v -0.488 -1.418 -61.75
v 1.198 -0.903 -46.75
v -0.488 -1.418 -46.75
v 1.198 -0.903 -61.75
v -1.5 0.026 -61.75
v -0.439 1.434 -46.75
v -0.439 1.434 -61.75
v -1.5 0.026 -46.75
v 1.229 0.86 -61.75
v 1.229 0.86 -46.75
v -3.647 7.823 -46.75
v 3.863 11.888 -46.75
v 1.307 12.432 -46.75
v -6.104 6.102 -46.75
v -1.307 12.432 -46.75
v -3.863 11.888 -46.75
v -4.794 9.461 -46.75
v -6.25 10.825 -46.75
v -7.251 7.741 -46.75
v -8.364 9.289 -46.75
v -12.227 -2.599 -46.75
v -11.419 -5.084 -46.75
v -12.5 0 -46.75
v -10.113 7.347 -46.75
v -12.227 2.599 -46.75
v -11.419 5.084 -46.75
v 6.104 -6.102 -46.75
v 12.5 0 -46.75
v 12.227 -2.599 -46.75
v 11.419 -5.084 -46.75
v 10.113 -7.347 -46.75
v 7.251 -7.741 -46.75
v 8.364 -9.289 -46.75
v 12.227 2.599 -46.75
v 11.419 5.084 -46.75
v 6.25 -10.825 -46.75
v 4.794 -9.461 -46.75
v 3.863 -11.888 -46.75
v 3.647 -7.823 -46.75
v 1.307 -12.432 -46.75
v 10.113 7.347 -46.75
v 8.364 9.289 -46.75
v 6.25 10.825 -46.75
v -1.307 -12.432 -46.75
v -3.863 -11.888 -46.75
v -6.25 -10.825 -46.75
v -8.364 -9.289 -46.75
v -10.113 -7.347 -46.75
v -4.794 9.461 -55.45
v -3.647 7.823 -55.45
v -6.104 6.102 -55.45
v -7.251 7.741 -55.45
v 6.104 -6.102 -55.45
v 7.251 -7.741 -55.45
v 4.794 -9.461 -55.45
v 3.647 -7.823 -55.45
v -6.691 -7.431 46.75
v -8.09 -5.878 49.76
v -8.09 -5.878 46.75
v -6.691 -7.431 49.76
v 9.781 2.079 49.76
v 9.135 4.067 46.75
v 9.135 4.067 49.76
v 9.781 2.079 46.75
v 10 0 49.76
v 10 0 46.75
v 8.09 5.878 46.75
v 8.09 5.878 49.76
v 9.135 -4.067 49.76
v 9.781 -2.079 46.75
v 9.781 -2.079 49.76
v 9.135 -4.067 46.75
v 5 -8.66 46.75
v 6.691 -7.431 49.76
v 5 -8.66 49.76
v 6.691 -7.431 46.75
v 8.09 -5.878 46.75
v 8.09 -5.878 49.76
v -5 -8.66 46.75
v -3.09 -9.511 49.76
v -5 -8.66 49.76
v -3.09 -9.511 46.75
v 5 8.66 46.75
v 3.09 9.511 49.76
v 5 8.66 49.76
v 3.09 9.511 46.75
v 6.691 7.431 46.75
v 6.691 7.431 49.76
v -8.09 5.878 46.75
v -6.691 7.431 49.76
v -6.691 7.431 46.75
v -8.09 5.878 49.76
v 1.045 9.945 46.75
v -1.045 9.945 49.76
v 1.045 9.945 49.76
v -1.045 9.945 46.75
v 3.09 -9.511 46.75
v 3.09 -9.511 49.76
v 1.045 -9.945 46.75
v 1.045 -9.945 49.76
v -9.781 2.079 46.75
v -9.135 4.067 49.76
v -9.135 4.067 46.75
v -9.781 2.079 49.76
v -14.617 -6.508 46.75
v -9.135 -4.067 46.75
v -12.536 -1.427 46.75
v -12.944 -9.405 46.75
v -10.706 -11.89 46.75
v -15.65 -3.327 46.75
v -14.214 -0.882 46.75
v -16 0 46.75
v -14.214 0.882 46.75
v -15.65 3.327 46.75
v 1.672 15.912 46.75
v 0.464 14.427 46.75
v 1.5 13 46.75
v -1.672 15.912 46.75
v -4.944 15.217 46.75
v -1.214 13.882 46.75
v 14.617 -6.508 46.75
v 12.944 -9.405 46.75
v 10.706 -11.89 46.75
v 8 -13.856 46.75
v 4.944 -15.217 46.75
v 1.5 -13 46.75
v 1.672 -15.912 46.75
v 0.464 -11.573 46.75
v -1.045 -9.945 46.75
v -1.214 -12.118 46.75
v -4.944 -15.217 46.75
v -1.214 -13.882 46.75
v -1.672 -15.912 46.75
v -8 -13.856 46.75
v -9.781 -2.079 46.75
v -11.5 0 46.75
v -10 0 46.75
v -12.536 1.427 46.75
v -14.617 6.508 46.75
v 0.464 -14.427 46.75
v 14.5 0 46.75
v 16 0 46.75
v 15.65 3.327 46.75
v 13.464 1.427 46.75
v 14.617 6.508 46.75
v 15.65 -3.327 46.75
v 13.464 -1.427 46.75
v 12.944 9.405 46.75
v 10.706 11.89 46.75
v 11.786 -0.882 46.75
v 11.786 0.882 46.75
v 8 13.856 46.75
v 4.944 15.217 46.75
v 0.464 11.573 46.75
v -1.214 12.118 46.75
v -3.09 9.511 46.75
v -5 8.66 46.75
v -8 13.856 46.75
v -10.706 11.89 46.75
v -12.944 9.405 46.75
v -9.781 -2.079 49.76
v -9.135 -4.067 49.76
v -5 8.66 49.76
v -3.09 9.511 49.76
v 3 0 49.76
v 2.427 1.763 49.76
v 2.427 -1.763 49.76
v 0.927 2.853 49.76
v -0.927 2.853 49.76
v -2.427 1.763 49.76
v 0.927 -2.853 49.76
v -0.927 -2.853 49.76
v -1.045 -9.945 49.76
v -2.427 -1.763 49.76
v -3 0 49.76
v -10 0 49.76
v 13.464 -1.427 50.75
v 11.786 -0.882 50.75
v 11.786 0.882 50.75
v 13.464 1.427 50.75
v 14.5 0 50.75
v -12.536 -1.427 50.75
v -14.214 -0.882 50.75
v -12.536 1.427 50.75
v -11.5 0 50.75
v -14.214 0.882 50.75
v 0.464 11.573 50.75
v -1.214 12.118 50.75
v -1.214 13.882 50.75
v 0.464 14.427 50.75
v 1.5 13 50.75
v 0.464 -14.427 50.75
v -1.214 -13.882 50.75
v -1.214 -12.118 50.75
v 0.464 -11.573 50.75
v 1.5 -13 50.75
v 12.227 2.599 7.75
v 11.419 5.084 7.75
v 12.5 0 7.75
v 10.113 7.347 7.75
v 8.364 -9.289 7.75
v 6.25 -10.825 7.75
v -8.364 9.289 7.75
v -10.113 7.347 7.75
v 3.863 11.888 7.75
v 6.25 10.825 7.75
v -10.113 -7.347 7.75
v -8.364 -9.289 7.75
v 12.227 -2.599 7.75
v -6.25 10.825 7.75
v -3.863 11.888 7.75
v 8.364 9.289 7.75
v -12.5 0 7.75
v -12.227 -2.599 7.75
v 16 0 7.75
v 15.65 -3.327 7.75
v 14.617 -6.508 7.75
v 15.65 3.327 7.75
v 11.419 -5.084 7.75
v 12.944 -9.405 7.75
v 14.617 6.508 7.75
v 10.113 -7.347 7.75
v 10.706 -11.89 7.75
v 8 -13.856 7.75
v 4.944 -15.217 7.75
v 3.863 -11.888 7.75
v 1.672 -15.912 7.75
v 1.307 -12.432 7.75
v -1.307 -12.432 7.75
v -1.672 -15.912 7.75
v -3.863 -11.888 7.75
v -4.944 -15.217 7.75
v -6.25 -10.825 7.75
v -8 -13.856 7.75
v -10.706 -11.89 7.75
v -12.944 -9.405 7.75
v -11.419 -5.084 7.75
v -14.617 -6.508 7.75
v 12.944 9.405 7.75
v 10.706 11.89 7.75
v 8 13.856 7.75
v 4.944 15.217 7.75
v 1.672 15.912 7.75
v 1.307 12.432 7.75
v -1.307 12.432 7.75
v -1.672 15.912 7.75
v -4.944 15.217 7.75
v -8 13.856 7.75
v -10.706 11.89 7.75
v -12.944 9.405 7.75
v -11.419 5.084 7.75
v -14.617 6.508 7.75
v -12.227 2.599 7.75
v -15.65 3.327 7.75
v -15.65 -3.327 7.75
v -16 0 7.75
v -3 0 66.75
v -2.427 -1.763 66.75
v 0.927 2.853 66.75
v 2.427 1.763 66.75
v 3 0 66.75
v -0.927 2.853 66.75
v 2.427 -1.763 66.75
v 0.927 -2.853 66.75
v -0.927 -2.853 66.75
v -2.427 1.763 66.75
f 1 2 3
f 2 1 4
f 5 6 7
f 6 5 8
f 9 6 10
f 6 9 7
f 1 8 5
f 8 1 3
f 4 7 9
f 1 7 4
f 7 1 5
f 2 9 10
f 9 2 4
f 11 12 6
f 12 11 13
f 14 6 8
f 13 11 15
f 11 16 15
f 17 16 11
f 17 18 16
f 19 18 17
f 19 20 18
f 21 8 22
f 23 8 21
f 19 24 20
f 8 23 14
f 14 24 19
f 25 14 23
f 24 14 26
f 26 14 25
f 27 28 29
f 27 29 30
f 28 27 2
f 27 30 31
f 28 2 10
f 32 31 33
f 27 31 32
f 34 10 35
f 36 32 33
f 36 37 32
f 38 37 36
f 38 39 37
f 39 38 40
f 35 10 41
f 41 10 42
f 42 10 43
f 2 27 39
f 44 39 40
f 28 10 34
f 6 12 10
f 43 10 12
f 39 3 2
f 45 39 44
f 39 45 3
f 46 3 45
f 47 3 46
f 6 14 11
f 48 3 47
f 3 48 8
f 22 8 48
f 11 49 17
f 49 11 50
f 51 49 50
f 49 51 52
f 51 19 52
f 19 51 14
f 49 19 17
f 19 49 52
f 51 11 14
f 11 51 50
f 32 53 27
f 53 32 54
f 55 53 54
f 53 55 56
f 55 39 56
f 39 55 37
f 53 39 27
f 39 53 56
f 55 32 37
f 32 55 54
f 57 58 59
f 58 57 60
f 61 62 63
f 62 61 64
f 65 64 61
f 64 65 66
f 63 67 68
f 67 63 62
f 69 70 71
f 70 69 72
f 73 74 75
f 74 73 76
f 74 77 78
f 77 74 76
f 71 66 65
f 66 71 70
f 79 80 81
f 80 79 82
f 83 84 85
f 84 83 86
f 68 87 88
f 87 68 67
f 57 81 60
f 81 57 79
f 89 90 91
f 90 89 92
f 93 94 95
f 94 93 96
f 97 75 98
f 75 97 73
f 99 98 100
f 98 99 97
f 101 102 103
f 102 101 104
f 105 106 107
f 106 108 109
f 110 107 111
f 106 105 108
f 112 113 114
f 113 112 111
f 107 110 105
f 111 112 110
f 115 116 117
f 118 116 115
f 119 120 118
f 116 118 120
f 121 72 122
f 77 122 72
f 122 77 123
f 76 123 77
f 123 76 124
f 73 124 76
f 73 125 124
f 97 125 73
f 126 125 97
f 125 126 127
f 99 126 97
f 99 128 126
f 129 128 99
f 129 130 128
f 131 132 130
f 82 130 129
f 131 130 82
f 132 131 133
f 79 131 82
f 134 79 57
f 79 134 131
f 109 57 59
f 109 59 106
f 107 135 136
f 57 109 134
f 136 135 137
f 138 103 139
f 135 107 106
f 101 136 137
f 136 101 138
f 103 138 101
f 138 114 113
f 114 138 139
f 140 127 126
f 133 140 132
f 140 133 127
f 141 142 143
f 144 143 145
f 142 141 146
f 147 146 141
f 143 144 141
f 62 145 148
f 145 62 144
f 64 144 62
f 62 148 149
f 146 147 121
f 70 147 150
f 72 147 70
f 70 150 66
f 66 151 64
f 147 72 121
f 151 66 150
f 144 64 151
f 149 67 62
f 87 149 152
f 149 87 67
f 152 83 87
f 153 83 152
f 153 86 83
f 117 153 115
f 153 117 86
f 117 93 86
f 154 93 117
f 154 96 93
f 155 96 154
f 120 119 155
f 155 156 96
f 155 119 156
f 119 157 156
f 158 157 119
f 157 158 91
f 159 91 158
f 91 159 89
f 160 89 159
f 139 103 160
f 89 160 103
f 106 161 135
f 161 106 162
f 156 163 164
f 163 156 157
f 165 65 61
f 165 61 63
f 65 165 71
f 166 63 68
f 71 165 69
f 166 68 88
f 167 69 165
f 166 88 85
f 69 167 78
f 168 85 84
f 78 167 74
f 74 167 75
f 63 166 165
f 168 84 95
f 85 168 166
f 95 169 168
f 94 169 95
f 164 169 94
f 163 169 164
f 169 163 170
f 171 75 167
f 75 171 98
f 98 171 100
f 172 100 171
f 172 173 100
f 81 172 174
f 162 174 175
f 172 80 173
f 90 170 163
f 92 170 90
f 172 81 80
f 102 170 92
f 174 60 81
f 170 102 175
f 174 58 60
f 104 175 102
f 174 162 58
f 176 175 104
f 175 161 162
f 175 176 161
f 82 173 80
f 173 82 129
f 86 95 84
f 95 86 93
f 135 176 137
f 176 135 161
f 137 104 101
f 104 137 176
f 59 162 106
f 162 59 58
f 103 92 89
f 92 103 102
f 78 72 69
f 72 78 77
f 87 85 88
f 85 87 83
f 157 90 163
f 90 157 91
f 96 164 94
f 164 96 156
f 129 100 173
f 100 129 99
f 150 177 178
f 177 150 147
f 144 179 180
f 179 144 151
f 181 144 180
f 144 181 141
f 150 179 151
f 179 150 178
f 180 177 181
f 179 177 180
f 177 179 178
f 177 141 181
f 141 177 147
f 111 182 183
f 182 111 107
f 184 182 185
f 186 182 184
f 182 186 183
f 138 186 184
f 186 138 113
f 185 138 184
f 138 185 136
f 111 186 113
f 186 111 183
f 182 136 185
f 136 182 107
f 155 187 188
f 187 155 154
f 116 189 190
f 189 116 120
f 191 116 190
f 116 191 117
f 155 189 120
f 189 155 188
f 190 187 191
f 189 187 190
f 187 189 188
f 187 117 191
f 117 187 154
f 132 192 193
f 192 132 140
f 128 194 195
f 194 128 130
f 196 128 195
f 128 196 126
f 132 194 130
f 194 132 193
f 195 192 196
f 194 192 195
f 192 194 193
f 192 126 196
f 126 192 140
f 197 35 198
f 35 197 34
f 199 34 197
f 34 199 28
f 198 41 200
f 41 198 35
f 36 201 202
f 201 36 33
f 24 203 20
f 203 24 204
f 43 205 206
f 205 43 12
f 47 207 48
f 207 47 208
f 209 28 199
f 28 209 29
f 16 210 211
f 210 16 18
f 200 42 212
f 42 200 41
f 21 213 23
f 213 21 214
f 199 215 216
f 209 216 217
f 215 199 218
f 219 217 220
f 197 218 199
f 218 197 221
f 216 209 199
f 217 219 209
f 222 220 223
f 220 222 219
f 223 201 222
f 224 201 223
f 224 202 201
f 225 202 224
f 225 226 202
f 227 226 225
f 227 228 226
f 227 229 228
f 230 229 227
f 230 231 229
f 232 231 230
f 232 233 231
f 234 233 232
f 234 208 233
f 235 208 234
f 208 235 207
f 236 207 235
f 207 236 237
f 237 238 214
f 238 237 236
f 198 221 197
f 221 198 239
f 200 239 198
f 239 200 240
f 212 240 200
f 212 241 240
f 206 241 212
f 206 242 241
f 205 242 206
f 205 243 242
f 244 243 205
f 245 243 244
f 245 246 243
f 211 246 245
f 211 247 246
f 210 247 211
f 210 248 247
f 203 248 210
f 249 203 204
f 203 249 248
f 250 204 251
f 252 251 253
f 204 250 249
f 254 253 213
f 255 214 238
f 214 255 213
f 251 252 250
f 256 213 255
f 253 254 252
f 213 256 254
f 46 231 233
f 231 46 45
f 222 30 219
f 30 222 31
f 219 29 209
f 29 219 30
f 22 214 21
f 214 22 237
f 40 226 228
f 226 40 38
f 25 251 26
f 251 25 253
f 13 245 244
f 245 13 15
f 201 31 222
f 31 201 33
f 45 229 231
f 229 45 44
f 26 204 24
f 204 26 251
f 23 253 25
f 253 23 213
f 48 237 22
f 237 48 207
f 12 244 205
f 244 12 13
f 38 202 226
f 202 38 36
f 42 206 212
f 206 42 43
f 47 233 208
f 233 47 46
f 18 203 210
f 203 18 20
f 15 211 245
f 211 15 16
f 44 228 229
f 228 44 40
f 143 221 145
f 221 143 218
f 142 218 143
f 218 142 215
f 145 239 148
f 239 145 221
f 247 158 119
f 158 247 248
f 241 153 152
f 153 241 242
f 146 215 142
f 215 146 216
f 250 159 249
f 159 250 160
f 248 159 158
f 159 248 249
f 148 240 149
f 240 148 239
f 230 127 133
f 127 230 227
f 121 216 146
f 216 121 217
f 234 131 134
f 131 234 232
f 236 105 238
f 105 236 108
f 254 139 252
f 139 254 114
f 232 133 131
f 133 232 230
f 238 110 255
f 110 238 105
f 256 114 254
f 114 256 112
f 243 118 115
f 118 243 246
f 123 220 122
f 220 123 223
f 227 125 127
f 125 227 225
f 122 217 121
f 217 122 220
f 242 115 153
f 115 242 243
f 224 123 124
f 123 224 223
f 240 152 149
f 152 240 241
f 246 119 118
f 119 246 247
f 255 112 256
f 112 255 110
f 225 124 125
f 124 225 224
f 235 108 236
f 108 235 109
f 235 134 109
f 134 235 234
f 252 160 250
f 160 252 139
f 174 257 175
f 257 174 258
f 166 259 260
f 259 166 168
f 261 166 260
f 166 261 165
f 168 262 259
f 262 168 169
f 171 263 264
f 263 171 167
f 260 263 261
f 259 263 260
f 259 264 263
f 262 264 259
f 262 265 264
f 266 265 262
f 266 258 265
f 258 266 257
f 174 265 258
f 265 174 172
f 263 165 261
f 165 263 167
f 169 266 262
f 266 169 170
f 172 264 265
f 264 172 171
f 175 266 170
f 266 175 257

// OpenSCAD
moteur_longueur = 54.5;
moteur_diametre = 25;

reducteur_longueur = 39;
reducteur_diametre = 32;

moteur_axe_longueur = 20;
moteur_axe_diametre = 6;

centre_moteur = (moteur_longueur+reducteur_longueur)/2;

module visM(M, L, taraudage) {
    if(taraudage == 0)
        cylinder(d=M  , h=L);
    else
        cylinder(d=M-1, h=L);
}


module moteur_maxxon() {
    translate([0,0,-centre_moteur]) {
        // Branchements + axe arrière
        mirror([0, 0, 1]) rotate([0,0,35]){
            cylinder(d=3, h=15);
            translate([0, 9.5, 8.7/2])
                cube([3, 2, 8.7], center=true);
            translate([0,-9.5, 8.7/2])
                cube([3, 2, 8.7], center=true);
        }
        // Moteur
        translate([0,0,0])
            cylinder(d=moteur_diametre, h=moteur_longueur);
        
        // Motoréducteur
        translate([0,0,moteur_longueur])
            cylinder(d=reducteur_diametre, h=reducteur_longueur);
        translate([0,0,moteur_longueur+reducteur_longueur]) {
            cylinder(d=20, h=3.01);
            translate([ 26/2,0,0]) visM(M=3,L=4, taraudage=0);
            translate([-26/2,0,0]) visM(M=3,L=4, taraudage=0);
            translate([0, 26/2,0]) visM(M=3,L=4, taraudage=0);
            translate([0,-26/2,0]) visM(M=3,L=4, taraudage=0);
        }
        // Axe
        translate([0,0,moteur_longueur+reducteur_longueur])
            cylinder(d=moteur_axe_diametre, h=moteur_axe_longueur);
    }
}


moteur_maxxon();
